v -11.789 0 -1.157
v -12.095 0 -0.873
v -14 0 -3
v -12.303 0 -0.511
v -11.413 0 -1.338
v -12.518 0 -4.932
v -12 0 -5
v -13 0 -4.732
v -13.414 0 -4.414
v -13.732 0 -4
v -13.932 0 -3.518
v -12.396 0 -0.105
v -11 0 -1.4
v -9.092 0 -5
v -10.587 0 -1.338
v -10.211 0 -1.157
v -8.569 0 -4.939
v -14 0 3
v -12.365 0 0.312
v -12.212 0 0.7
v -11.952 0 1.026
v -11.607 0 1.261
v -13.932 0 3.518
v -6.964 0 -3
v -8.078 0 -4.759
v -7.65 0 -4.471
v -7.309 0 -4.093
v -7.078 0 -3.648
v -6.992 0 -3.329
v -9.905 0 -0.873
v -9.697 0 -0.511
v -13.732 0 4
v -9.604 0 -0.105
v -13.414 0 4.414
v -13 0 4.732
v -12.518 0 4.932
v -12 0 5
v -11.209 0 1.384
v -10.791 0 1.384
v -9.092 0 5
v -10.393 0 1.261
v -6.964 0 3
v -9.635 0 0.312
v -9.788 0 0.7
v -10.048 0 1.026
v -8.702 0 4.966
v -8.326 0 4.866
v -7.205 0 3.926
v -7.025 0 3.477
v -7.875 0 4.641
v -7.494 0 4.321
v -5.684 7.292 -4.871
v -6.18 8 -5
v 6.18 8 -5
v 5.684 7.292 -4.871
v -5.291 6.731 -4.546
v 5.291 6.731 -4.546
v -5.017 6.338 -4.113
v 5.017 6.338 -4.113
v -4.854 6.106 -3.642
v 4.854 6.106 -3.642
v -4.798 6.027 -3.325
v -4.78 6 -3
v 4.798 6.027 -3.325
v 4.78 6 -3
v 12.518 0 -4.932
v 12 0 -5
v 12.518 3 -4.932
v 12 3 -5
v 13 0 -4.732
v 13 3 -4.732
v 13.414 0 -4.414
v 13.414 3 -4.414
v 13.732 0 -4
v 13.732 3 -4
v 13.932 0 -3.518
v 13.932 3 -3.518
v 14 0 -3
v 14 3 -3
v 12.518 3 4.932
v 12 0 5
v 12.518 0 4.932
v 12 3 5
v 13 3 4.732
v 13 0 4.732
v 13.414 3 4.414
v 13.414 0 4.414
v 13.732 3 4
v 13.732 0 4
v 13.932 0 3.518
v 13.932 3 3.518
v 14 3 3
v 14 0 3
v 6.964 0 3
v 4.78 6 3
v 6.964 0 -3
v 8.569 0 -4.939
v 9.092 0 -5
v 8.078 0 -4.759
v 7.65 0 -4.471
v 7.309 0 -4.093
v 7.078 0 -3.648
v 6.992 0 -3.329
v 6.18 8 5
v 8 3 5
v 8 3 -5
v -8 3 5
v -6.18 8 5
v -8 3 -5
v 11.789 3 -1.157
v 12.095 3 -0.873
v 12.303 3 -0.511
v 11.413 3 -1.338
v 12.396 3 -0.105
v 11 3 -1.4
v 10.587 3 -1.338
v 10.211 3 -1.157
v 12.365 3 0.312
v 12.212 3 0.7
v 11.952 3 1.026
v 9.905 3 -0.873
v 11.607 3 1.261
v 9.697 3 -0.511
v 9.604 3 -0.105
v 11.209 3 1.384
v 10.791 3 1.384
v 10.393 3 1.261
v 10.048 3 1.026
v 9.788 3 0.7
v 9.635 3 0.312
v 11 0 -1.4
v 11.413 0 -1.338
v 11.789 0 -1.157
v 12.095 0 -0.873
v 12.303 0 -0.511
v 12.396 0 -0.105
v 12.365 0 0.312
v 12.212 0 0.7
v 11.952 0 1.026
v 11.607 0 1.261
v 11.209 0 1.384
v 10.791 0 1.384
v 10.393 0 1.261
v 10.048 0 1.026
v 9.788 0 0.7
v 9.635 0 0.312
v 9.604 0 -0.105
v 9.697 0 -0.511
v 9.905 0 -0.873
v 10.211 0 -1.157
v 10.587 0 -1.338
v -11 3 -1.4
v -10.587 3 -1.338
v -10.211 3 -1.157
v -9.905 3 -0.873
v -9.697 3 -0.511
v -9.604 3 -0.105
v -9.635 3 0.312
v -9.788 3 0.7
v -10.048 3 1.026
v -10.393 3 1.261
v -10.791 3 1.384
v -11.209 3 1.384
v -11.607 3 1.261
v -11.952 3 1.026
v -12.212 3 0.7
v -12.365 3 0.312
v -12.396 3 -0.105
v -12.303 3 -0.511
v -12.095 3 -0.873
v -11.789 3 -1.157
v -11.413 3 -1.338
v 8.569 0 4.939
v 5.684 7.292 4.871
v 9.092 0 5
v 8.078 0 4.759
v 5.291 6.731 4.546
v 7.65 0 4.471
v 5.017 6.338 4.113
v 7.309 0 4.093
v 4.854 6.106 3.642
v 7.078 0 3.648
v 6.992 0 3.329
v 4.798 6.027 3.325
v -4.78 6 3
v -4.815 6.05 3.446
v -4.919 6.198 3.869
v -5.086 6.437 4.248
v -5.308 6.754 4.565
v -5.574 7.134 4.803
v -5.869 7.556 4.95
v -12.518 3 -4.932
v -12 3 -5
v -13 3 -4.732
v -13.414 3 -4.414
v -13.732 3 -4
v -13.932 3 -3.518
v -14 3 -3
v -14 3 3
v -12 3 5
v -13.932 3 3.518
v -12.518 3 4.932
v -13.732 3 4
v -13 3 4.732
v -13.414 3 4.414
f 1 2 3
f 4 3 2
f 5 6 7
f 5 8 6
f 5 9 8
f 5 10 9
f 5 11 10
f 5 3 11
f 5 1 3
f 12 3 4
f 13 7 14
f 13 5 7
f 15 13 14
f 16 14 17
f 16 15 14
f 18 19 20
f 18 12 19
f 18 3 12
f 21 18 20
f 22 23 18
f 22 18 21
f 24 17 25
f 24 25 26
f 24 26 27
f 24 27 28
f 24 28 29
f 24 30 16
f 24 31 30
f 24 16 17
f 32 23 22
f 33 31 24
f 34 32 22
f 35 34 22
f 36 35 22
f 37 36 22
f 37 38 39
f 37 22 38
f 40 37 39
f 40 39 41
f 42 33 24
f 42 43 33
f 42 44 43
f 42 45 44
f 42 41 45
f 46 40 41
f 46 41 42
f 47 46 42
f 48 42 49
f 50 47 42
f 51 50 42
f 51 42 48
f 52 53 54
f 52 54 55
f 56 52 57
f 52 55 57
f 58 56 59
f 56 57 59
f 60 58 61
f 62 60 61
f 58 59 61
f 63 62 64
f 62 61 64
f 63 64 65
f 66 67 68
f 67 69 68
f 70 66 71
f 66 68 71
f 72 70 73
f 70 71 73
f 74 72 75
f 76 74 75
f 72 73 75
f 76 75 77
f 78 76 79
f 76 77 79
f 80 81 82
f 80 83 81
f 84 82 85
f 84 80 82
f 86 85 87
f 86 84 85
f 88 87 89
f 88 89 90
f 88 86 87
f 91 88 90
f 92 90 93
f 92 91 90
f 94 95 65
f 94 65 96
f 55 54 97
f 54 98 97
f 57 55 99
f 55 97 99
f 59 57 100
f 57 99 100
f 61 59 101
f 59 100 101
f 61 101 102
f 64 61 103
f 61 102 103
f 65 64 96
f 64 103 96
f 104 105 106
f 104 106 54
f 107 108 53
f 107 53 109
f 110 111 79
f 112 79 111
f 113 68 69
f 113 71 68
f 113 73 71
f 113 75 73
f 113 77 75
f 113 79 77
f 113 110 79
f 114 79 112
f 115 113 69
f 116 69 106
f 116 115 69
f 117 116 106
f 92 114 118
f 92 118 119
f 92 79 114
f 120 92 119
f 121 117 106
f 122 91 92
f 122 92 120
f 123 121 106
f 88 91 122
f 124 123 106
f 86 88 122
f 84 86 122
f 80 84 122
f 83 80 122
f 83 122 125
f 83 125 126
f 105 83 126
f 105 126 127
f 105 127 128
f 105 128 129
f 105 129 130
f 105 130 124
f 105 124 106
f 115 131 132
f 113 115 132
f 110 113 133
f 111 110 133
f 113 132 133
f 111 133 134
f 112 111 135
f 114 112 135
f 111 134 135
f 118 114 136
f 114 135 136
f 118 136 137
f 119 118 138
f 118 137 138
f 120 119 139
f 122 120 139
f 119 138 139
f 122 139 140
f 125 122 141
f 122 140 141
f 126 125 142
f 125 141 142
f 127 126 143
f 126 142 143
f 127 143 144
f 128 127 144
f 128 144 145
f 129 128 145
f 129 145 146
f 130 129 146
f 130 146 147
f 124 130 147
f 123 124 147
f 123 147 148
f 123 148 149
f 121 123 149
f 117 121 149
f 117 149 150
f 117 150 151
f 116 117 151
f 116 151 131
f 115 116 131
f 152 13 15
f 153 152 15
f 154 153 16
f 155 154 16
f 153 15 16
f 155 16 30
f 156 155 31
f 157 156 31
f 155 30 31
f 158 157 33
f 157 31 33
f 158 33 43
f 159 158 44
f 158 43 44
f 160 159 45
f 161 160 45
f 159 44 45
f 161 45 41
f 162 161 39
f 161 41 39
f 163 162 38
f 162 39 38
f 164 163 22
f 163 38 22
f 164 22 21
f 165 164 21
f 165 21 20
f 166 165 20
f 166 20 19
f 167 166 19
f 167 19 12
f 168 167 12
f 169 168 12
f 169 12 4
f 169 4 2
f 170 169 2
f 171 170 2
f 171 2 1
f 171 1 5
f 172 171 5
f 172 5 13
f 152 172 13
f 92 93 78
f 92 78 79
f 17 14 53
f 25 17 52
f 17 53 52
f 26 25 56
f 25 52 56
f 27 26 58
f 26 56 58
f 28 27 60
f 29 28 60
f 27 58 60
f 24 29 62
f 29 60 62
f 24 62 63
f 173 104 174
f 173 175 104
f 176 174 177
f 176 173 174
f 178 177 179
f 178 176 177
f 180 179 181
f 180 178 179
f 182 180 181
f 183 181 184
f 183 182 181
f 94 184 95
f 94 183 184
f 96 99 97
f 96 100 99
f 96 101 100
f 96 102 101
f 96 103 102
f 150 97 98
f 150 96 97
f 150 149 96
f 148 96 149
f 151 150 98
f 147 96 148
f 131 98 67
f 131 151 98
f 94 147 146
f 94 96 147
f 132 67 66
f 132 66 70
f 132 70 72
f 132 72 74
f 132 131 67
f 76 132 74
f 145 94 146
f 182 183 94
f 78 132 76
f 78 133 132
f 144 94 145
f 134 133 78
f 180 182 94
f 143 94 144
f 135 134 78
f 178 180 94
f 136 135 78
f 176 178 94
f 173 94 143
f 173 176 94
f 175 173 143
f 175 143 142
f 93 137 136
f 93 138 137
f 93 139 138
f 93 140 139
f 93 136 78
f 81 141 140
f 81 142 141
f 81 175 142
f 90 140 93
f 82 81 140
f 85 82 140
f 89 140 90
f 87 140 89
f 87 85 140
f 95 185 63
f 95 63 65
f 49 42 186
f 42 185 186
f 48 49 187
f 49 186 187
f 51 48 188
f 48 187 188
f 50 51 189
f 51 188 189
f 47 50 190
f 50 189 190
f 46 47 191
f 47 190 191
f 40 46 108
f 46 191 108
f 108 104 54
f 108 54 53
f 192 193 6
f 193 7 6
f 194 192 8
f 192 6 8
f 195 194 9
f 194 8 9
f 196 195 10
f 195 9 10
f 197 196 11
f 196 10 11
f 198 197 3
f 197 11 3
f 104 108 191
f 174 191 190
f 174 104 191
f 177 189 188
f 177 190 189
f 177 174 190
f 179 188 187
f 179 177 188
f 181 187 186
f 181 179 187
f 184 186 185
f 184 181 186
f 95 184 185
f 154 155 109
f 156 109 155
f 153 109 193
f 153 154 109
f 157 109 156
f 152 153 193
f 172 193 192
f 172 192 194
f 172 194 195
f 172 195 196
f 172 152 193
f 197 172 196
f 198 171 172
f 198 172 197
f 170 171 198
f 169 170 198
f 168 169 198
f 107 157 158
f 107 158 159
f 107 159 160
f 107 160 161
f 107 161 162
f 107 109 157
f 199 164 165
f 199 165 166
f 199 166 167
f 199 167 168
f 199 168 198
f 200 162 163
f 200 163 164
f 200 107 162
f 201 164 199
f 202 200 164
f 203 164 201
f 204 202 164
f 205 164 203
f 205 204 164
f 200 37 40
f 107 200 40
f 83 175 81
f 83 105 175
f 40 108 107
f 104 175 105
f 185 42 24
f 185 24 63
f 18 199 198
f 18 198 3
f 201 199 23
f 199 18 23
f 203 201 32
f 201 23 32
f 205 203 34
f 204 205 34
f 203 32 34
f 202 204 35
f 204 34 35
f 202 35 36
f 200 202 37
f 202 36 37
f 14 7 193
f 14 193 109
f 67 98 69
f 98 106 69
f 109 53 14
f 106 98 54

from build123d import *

# Parameters (mm, degrees)
BOSS_EXTRUDE1_DEPTH = 5
CUT_EXTRUDE1_REACH  = 18.882
SKETCH2_R           = 1.4
FILLET1_R           = 2
FILLET2_R           = 2


with BuildPart() as part:
    # Sketch1 → Boss-Extrude1 (new, symmetric)
    with BuildSketch(Plane.XY):
        Polygon((-14, 0), (-6.963555158, 0), (-4.779733752, 6), (4.779733752, 6), (6.963555158, 0), (14, 0), (14, 3), (8, 3), (6.180148829, 8), (-6.180148829, 8), (-8, 3), (-14, 3), align=None)
    extrude(amount=BOSS_EXTRUDE1_DEPTH, both=True)

    # Sketch2 → Cut-Extrude1 (cut, up to next)
    with BuildSketch(Plane.XZ, mode=Mode.PRIVATE) as cut_extrude1_sk1:
        with Locations(Location((-11, 0, 0), (0, 0, 270))):
            Circle(SKETCH2_R)
    cut_extrude1_tool1 = extrude(cut_extrude1_sk1.sketch, amount=-CUT_EXTRUDE1_REACH, mode=Mode.PRIVATE) & part.part
    # Sketch2 → Cut-Extrude1 (cut, up to next)
    with BuildSketch(Plane.XZ, mode=Mode.PRIVATE) as cut_extrude1_sk2:
        with Locations(Location((11, 0, 0), (0, 0, 270))):
            Circle(SKETCH2_R)
    cut_extrude1_tool2 = extrude(cut_extrude1_sk2.sketch, amount=-CUT_EXTRUDE1_REACH, mode=Mode.PRIVATE) & part.part
    add(cut_extrude1_tool1.solids().sort_by_distance((-11, 0, 0))[0], mode=Mode.SUBTRACT)
    add(cut_extrude1_tool2.solids().sort_by_distance((11, 0, 0))[0], mode=Mode.SUBTRACT)

    # Fillet1
    fillet1_edges = [part.edges().sort_by_distance(p)[0] for p in [
        (-5.871644455, 3, 5),
        (5.871644455, 3, -5),
        (0, 6, -5),
        (-5.871644455, 3, -5),
        (0, 6, 5),
        (5.871644455, 3, 5),
    ]]
    fillet(fillet1_edges, radius=FILLET1_R - 0.0001)  # a hair under: the kernel refuses the full size

    # Fillet2
    fillet2_edges = [part.edges().sort_by_distance(p)[0] for p in [
        (14, 1.5, -5),
        (-14, 1.5, -5),
        (14, 1.5, 5),
        (-14, 1.5, 5),
    ]]
    fillet(fillet2_edges, radius=FILLET2_R)


solid = part.part
